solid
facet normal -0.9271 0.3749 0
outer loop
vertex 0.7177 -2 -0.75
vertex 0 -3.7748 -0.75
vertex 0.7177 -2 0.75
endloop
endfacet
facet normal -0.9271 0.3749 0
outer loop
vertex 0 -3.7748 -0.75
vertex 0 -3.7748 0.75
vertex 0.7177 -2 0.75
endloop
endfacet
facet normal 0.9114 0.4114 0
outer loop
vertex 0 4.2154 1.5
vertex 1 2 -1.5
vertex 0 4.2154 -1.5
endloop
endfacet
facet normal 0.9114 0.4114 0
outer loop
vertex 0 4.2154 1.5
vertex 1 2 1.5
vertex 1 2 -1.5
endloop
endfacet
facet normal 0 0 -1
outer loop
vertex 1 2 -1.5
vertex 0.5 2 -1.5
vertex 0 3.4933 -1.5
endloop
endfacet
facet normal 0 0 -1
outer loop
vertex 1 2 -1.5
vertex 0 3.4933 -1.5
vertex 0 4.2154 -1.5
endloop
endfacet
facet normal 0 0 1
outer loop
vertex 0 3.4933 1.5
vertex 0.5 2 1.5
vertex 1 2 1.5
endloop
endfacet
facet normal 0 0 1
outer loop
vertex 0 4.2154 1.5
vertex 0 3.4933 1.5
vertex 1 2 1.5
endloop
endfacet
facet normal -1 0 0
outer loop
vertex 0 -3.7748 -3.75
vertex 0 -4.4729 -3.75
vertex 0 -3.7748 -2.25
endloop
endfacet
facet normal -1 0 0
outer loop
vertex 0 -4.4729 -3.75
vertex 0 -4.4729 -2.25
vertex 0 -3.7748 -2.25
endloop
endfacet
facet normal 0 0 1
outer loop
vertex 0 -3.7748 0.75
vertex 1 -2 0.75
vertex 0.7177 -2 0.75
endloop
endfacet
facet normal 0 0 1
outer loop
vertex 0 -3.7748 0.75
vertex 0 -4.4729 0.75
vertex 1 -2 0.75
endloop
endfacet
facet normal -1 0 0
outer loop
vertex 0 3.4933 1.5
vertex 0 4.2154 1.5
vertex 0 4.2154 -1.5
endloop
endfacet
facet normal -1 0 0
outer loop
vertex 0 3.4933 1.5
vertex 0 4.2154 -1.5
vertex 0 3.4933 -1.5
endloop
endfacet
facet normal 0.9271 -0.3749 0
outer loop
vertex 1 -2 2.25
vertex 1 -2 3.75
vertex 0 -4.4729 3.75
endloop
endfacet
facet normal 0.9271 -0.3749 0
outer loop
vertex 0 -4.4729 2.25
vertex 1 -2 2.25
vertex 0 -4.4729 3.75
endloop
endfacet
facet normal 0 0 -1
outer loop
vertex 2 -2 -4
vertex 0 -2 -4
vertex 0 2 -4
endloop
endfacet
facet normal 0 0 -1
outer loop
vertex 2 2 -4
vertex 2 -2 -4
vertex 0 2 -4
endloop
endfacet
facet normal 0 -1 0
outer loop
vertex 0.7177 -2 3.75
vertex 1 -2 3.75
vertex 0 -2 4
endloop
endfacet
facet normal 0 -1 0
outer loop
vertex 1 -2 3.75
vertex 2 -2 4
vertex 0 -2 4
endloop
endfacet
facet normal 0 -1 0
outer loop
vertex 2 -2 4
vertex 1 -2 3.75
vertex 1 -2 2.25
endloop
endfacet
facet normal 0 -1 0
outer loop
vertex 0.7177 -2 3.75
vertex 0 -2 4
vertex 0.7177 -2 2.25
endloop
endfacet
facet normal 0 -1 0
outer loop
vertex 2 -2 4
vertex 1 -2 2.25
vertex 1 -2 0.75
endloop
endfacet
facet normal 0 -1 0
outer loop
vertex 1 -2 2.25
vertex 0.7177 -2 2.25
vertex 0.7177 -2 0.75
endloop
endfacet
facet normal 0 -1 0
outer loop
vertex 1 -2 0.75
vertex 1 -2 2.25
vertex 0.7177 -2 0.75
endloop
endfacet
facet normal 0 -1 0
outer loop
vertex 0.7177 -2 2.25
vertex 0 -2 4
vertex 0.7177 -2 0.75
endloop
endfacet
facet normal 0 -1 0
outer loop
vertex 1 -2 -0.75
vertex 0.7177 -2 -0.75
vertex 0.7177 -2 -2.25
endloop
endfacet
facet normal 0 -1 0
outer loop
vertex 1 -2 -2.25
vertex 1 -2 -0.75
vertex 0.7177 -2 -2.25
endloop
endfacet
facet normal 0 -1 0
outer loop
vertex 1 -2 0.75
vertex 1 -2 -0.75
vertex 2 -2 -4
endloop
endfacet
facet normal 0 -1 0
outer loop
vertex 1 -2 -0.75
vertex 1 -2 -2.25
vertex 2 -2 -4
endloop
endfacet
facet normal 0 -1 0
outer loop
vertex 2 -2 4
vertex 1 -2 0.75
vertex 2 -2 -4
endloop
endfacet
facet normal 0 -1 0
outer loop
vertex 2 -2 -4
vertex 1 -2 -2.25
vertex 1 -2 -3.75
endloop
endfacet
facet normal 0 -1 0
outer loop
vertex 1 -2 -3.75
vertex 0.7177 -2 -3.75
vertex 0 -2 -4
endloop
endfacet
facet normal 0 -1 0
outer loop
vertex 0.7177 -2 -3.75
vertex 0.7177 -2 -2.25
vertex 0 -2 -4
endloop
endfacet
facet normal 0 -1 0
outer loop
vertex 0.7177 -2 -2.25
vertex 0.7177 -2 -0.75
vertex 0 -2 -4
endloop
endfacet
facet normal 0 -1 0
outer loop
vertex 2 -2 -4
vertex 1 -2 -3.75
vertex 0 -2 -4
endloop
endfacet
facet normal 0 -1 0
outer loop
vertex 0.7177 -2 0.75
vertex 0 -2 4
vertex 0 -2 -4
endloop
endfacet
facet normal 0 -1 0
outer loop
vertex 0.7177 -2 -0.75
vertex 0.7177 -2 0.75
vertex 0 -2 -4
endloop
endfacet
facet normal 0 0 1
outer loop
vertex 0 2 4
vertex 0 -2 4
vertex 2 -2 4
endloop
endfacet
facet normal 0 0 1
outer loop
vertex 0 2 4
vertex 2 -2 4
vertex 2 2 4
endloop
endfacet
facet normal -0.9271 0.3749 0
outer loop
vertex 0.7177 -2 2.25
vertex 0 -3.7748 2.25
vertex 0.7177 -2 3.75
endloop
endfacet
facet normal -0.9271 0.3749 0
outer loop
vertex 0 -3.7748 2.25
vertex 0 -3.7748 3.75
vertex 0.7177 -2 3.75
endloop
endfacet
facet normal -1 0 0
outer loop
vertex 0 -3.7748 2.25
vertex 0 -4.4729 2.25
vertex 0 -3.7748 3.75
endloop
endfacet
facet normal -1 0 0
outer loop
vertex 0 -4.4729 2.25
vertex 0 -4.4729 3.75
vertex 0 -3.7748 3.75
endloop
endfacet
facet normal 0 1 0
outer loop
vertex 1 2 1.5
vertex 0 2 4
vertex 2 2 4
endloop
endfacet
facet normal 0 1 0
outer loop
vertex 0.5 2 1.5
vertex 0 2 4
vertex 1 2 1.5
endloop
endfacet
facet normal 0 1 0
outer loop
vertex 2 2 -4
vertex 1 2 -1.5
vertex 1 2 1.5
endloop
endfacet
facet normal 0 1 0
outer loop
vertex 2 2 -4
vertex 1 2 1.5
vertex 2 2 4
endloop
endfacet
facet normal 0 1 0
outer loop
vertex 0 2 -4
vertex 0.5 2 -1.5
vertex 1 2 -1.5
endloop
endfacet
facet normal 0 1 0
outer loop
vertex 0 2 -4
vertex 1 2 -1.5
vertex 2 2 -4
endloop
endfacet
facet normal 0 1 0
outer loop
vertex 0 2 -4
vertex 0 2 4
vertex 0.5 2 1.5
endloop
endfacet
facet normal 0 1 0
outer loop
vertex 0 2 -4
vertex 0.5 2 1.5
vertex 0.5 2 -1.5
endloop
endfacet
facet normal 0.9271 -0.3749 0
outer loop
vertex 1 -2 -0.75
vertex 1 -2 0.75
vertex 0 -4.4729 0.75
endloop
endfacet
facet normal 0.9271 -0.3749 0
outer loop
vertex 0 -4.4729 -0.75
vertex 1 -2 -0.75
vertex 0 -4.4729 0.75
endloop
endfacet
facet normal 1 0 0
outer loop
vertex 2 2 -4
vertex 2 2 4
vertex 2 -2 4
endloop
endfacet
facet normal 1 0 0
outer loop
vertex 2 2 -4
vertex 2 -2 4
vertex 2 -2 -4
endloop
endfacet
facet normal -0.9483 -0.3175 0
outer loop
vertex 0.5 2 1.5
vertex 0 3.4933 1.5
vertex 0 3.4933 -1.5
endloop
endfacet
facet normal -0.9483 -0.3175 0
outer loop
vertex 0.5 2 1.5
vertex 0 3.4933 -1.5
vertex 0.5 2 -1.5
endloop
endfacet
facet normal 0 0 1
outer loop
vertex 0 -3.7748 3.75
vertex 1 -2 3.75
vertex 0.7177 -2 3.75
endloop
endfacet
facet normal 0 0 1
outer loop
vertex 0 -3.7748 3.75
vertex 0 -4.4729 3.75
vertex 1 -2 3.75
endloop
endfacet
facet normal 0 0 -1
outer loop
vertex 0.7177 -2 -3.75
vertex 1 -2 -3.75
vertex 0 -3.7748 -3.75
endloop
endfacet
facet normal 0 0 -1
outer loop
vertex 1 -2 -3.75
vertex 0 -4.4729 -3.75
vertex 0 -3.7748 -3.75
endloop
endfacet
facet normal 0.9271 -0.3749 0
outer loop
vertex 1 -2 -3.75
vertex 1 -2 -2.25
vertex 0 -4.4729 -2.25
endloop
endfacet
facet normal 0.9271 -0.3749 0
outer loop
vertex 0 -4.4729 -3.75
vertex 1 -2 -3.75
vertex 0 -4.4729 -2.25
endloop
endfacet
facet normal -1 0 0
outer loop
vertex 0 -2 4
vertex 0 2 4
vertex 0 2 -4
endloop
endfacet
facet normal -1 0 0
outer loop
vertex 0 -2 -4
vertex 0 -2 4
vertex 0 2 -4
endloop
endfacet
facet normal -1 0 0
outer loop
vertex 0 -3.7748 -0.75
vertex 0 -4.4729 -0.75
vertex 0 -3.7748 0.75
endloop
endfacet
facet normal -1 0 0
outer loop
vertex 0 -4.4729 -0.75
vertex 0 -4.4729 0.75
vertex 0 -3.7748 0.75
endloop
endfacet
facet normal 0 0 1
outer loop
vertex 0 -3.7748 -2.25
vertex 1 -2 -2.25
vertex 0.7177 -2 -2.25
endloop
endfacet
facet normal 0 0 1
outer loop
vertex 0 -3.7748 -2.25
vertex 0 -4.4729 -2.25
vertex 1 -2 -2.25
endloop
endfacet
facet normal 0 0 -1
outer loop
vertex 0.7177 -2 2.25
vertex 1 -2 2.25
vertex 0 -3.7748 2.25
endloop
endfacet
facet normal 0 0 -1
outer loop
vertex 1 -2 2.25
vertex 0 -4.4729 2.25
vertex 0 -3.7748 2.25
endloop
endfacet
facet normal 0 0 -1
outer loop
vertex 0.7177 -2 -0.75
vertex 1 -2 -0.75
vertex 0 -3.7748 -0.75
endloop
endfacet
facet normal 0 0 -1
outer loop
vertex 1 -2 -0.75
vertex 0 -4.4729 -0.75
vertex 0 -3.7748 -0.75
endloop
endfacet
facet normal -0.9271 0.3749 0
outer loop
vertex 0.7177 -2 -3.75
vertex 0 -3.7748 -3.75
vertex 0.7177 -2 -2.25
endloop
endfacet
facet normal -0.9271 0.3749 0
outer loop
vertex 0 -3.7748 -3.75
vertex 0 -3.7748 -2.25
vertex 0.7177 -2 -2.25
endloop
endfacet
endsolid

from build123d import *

# Parameters (mm, degrees)
SKETCH_1_W                 = 8
SKETCH_1_H                 = 4
EXTRUDE_1_DEPTH            = 2
EXTRUDE_2_DEPTH            = 1.5
EXTRUDE_3_DEPTH            = 0.75
PATTERN_LINEAR_1_COUNT     = 2
PATTERN_LINEAR_1_PITCH     = 3
PATTERN_LINEAR_1_COL_COUNT = 2
PATTERN_LINEAR_1_COL_PITCH = 3


with BuildPart() as part:
    # 草图1 → 凸台-拉伸1 (new body)
    with BuildSketch(Plane(origin=(0, 0, 0), x_dir=(0, 0, -1), z_dir=(1, 0, 0))):
        Rectangle(SKETCH_1_W, SKETCH_1_H)
    extrude(amount=EXTRUDE_1_DEPTH)

    # 草图2 → 凸台-拉伸2 (add, symmetric)
    with BuildSketch(Plane.XY):
        Polygon((1, 2), (0, 4.215421364), (0, 3.49328806), (0.5, 2), align=None)
    extrude(amount=EXTRUDE_2_DEPTH, both=True)

    # 草图3 → 凸台-拉伸3 (add, symmetric)
    with BuildSketch(Plane.XY):
        Polygon((1, -2), (0, -4.472901544), (0, -3.77481073), (0.717703758, -2), align=None)
    extrude_3 = extrude(amount=EXTRUDE_3_DEPTH, both=True)

    # 阵列(线性)1: 凸台-拉伸3 ×2
    with Locations(*[(0, 0, i * PATTERN_LINEAR_1_PITCH) for i in range(1, PATTERN_LINEAR_1_COUNT)]):
        add(extrude_3)

    # 阵列(线性)1 col: 凸台-拉伸3 ×2
    with Locations(*[(0, 0, -i * PATTERN_LINEAR_1_COL_PITCH) for i in range(1, PATTERN_LINEAR_1_COL_COUNT)]):
        add(extrude_3)


solid = part.part
